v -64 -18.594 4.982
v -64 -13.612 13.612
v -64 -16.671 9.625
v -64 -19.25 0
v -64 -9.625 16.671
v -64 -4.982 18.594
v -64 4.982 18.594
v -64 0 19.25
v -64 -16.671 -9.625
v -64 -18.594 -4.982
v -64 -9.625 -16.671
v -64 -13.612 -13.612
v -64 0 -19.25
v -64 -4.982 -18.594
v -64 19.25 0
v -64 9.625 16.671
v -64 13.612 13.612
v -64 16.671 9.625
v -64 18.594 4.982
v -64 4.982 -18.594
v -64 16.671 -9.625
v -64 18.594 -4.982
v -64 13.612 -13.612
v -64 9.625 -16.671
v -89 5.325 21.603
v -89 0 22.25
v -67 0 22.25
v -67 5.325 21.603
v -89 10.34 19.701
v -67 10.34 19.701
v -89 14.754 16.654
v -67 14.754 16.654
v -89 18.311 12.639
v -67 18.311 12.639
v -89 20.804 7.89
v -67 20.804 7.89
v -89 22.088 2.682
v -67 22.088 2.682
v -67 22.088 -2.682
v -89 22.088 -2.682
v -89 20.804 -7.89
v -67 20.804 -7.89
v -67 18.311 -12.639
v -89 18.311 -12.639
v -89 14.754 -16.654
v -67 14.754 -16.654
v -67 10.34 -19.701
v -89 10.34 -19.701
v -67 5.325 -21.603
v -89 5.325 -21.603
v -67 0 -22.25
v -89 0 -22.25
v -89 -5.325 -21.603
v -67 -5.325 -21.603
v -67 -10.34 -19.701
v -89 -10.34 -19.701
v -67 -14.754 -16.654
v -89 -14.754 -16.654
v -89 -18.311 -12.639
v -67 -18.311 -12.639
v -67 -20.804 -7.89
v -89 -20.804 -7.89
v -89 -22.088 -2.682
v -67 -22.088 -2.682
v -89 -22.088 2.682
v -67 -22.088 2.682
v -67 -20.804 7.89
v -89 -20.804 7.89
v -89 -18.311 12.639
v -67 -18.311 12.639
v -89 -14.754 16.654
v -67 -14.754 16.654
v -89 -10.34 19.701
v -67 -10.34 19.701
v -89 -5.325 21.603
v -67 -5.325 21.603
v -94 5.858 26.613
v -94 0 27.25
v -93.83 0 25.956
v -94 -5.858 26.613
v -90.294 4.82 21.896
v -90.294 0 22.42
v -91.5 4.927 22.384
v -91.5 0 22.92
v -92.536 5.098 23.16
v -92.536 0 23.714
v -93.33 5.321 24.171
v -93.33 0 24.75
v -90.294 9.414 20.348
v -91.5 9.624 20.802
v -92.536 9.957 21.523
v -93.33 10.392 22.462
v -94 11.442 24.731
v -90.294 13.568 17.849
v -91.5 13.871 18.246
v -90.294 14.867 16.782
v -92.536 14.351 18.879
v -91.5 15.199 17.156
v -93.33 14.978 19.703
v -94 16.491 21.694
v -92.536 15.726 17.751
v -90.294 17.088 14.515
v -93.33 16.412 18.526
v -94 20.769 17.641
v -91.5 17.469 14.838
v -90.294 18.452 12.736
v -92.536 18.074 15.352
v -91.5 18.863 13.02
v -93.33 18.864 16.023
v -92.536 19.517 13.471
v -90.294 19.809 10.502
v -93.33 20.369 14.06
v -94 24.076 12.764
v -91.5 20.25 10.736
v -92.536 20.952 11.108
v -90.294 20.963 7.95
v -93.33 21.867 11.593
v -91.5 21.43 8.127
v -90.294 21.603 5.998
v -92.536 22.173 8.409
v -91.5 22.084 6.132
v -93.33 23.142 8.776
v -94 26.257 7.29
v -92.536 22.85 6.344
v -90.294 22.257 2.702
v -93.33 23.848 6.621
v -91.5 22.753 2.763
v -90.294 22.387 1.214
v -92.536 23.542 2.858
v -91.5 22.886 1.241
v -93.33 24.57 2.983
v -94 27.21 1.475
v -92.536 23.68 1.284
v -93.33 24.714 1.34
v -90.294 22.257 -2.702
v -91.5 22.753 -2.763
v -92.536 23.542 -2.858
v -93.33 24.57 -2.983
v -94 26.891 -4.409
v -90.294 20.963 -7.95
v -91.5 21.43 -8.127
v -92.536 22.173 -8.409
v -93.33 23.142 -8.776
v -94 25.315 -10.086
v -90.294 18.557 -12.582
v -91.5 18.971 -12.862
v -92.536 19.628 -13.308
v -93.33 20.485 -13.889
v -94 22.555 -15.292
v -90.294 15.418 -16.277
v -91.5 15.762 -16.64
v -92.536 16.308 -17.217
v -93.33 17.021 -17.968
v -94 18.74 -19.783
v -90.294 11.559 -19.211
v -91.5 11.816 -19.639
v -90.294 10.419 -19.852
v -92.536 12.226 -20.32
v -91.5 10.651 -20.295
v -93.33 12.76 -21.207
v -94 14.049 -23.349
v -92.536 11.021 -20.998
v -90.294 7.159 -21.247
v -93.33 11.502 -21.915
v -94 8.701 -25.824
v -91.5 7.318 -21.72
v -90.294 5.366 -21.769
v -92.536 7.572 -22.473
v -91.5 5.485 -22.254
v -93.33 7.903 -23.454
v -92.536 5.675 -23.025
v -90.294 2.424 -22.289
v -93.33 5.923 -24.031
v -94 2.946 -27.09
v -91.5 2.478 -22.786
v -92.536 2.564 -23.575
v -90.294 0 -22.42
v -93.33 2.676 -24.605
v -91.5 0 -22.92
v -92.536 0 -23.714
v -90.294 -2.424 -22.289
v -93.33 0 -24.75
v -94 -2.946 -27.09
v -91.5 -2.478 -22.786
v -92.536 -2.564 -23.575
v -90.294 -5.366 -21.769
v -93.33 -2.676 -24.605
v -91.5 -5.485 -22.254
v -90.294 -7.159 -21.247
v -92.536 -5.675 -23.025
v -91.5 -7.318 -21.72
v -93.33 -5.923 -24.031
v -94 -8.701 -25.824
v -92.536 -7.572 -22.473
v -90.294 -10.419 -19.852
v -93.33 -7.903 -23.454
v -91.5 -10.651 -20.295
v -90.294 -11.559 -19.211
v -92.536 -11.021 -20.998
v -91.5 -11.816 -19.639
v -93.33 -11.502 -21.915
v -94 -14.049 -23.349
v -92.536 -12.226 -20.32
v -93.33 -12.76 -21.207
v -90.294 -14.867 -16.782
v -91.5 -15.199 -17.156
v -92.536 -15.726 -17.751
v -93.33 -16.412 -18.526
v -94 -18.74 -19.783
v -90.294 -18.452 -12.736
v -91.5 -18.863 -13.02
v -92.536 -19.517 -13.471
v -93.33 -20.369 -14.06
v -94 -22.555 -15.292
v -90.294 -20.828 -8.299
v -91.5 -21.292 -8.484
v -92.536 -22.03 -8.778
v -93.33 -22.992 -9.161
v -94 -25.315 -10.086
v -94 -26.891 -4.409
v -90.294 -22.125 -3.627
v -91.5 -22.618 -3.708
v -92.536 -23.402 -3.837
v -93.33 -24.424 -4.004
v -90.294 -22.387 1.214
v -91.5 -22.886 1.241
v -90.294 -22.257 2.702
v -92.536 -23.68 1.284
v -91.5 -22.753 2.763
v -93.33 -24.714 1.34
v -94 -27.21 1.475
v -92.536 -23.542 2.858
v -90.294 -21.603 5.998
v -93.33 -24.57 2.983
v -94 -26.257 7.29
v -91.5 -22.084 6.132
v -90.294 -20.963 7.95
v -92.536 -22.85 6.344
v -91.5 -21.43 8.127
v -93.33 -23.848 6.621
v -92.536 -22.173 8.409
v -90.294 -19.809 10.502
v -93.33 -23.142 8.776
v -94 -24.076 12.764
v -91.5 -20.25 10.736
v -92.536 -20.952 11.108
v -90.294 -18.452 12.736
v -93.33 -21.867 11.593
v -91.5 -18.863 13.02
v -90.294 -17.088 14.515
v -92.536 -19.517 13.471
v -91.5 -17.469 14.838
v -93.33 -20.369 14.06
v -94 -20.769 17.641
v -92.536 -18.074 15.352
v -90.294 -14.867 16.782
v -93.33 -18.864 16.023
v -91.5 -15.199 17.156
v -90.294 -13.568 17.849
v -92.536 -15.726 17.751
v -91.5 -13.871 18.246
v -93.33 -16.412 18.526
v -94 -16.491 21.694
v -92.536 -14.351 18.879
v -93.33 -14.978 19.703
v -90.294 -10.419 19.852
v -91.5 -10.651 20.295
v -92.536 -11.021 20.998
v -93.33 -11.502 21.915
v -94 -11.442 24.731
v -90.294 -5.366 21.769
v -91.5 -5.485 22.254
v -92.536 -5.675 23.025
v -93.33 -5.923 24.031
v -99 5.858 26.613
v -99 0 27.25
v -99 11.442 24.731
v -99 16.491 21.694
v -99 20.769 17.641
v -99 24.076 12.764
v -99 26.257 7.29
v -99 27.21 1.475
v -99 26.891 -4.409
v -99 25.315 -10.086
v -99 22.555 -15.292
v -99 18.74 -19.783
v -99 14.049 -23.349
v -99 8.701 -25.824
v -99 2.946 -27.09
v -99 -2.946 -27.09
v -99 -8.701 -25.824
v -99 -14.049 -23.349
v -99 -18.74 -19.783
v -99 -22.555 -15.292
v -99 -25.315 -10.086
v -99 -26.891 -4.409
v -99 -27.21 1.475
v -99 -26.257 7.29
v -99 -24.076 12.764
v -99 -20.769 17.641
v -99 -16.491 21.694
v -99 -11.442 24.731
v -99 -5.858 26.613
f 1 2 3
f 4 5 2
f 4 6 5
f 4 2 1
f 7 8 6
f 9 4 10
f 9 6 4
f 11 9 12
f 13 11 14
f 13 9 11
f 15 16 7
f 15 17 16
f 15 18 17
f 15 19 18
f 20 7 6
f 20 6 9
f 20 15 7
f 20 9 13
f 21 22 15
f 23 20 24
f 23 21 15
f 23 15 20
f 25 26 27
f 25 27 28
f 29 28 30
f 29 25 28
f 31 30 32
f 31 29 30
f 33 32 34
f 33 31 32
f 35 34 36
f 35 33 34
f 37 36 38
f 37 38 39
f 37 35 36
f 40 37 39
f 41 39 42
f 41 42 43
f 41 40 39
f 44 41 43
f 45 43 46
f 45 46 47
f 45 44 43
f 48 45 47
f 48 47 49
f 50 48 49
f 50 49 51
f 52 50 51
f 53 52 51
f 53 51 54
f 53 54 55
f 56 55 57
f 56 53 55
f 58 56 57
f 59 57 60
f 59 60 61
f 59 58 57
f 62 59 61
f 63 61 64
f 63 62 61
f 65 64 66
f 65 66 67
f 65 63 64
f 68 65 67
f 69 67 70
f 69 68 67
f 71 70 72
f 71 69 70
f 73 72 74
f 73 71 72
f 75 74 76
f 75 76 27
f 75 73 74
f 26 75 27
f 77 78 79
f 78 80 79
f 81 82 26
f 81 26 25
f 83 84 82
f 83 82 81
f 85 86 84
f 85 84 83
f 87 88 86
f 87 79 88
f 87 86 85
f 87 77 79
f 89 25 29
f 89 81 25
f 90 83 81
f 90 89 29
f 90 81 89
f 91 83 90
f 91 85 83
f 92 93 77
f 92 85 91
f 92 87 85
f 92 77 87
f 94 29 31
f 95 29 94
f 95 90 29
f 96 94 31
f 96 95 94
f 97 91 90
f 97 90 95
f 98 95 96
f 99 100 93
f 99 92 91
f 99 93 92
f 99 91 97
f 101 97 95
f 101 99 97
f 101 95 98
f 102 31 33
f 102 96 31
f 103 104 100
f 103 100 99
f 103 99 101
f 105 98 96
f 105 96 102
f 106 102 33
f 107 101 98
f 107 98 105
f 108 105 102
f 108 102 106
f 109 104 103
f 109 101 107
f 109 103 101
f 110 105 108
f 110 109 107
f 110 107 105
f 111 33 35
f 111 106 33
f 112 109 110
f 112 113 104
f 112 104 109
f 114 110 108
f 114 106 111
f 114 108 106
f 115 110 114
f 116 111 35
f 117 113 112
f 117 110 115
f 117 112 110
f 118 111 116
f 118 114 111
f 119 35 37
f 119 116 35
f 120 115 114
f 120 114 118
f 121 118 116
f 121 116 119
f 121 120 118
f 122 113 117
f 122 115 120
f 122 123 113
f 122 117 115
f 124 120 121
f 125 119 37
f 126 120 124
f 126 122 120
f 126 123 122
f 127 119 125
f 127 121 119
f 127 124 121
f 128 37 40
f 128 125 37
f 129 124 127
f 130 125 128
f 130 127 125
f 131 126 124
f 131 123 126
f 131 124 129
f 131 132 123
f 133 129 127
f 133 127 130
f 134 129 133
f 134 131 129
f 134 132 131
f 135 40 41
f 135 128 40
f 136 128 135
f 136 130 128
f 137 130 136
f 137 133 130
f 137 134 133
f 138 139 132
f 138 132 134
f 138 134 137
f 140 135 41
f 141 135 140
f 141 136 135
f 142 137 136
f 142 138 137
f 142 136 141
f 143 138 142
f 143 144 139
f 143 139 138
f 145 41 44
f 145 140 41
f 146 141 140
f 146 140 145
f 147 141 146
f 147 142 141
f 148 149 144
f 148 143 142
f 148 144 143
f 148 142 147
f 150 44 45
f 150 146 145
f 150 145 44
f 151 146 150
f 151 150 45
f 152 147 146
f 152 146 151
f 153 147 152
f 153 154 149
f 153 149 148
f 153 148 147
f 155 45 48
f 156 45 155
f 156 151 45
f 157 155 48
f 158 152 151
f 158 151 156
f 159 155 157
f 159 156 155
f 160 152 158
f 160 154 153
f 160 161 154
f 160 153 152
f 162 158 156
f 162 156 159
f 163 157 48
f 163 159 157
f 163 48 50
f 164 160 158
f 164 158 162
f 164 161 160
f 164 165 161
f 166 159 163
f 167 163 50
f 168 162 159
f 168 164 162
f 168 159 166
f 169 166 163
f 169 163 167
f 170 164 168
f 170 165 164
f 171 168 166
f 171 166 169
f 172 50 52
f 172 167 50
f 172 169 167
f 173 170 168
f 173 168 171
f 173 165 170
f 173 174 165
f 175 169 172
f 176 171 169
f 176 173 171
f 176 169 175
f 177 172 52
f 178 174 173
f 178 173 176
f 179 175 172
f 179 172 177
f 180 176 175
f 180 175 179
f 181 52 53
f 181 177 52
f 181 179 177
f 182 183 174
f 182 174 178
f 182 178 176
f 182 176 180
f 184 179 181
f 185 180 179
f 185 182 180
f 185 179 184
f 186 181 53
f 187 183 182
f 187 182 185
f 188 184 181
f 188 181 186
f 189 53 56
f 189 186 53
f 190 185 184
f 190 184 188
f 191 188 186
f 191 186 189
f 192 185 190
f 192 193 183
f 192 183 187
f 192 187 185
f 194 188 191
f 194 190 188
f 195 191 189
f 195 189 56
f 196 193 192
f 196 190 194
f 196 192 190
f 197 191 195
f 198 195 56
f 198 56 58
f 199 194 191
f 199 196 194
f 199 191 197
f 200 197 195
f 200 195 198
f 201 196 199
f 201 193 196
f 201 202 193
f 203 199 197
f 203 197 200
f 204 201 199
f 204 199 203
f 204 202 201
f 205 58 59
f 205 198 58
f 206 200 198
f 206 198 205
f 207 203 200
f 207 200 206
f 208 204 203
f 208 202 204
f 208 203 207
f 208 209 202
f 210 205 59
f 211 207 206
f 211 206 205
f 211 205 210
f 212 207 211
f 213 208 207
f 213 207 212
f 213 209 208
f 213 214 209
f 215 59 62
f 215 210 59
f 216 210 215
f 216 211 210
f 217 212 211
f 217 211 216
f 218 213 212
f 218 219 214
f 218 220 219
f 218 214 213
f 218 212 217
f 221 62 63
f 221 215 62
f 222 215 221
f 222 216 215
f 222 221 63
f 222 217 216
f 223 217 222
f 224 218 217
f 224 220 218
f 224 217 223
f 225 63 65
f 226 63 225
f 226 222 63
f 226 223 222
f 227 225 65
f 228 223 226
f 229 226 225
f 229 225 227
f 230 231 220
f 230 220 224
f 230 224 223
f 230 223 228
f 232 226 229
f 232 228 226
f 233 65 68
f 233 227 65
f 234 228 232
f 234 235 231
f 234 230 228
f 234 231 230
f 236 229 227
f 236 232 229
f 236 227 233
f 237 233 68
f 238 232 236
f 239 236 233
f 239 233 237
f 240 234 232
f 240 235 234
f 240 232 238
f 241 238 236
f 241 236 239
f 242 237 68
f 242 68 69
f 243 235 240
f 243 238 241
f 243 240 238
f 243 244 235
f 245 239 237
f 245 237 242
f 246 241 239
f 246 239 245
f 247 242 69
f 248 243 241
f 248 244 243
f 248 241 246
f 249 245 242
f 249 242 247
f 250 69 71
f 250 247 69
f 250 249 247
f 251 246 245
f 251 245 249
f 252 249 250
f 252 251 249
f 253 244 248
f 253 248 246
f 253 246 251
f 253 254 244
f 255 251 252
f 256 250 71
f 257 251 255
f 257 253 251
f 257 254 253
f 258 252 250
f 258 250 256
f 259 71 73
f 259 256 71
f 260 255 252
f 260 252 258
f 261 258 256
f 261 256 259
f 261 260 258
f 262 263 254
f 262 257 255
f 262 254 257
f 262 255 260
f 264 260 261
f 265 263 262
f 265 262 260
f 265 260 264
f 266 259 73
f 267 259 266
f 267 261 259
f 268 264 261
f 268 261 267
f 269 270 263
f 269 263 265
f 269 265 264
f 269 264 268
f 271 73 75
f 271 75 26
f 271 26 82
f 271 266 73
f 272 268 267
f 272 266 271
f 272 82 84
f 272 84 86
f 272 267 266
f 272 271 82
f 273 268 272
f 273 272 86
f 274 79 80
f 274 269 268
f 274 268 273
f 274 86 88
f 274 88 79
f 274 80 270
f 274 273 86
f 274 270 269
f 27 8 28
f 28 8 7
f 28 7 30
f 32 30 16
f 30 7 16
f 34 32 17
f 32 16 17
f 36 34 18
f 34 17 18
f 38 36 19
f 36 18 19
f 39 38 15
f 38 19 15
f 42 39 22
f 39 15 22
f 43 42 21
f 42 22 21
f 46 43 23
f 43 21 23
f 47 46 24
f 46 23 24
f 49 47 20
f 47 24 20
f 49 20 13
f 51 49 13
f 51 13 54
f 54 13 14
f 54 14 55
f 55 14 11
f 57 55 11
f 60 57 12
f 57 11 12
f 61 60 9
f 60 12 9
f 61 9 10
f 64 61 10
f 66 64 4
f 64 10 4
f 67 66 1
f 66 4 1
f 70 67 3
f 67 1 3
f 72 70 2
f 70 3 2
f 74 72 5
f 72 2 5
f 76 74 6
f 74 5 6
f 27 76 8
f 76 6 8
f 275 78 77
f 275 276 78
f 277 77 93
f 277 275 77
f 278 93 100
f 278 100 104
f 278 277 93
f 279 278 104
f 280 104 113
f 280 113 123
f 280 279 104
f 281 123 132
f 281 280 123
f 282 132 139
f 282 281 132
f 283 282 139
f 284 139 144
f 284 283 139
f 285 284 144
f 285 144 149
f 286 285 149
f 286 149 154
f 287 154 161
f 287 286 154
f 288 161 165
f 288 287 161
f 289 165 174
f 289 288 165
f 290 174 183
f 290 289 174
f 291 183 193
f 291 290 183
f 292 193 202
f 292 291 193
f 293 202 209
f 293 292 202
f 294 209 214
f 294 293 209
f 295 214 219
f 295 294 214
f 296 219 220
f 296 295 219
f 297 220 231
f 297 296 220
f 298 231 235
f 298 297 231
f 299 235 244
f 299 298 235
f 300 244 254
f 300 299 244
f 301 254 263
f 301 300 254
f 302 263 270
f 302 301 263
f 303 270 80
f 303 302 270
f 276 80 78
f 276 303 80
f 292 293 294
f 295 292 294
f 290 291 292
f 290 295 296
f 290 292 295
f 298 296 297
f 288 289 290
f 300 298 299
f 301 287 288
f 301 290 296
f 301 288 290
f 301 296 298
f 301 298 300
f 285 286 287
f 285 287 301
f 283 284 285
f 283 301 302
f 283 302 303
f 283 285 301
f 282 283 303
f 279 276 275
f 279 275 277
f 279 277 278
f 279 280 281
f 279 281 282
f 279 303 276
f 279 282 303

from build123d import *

# Parameters (mm, degrees)
F2_SIZE = 3
F3_R    = 4.99999


# Not quite as in the source:
# - a fillet or chamfer is up to 0.001 mm smaller than in the source, because OpenCascade refuses the exact size


with BuildPart() as f1:
    # F0 (on Front) → F1 (revolve)
    with BuildSketch(Plane.XZ):
        Polygon((-64, 22.25), (-94, 22.25), (-94, 27.25), (-99, 27.25), (-99, 0), (-64, 0), align=None)
    revolve(axis=Axis((-47, 0, 0), (-1, 0, 0)))

    # F2
    f2_edges = [f1.edges().sort_by_distance(p)[0] for p in [
        (-64, 0, -22.25),
    ]]
    chamfer(f2_edges, length=F2_SIZE)

    # F3 (radius 5 in the source; OpenCascade refuses exactly that, so slightly less here)
    f3_edges = [f1.edges().sort_by_distance(p)[0] for p in [
        (-94, 0, -22.25),
    ]]
    fillet(f3_edges, radius=F3_R)


solid = f1.part
